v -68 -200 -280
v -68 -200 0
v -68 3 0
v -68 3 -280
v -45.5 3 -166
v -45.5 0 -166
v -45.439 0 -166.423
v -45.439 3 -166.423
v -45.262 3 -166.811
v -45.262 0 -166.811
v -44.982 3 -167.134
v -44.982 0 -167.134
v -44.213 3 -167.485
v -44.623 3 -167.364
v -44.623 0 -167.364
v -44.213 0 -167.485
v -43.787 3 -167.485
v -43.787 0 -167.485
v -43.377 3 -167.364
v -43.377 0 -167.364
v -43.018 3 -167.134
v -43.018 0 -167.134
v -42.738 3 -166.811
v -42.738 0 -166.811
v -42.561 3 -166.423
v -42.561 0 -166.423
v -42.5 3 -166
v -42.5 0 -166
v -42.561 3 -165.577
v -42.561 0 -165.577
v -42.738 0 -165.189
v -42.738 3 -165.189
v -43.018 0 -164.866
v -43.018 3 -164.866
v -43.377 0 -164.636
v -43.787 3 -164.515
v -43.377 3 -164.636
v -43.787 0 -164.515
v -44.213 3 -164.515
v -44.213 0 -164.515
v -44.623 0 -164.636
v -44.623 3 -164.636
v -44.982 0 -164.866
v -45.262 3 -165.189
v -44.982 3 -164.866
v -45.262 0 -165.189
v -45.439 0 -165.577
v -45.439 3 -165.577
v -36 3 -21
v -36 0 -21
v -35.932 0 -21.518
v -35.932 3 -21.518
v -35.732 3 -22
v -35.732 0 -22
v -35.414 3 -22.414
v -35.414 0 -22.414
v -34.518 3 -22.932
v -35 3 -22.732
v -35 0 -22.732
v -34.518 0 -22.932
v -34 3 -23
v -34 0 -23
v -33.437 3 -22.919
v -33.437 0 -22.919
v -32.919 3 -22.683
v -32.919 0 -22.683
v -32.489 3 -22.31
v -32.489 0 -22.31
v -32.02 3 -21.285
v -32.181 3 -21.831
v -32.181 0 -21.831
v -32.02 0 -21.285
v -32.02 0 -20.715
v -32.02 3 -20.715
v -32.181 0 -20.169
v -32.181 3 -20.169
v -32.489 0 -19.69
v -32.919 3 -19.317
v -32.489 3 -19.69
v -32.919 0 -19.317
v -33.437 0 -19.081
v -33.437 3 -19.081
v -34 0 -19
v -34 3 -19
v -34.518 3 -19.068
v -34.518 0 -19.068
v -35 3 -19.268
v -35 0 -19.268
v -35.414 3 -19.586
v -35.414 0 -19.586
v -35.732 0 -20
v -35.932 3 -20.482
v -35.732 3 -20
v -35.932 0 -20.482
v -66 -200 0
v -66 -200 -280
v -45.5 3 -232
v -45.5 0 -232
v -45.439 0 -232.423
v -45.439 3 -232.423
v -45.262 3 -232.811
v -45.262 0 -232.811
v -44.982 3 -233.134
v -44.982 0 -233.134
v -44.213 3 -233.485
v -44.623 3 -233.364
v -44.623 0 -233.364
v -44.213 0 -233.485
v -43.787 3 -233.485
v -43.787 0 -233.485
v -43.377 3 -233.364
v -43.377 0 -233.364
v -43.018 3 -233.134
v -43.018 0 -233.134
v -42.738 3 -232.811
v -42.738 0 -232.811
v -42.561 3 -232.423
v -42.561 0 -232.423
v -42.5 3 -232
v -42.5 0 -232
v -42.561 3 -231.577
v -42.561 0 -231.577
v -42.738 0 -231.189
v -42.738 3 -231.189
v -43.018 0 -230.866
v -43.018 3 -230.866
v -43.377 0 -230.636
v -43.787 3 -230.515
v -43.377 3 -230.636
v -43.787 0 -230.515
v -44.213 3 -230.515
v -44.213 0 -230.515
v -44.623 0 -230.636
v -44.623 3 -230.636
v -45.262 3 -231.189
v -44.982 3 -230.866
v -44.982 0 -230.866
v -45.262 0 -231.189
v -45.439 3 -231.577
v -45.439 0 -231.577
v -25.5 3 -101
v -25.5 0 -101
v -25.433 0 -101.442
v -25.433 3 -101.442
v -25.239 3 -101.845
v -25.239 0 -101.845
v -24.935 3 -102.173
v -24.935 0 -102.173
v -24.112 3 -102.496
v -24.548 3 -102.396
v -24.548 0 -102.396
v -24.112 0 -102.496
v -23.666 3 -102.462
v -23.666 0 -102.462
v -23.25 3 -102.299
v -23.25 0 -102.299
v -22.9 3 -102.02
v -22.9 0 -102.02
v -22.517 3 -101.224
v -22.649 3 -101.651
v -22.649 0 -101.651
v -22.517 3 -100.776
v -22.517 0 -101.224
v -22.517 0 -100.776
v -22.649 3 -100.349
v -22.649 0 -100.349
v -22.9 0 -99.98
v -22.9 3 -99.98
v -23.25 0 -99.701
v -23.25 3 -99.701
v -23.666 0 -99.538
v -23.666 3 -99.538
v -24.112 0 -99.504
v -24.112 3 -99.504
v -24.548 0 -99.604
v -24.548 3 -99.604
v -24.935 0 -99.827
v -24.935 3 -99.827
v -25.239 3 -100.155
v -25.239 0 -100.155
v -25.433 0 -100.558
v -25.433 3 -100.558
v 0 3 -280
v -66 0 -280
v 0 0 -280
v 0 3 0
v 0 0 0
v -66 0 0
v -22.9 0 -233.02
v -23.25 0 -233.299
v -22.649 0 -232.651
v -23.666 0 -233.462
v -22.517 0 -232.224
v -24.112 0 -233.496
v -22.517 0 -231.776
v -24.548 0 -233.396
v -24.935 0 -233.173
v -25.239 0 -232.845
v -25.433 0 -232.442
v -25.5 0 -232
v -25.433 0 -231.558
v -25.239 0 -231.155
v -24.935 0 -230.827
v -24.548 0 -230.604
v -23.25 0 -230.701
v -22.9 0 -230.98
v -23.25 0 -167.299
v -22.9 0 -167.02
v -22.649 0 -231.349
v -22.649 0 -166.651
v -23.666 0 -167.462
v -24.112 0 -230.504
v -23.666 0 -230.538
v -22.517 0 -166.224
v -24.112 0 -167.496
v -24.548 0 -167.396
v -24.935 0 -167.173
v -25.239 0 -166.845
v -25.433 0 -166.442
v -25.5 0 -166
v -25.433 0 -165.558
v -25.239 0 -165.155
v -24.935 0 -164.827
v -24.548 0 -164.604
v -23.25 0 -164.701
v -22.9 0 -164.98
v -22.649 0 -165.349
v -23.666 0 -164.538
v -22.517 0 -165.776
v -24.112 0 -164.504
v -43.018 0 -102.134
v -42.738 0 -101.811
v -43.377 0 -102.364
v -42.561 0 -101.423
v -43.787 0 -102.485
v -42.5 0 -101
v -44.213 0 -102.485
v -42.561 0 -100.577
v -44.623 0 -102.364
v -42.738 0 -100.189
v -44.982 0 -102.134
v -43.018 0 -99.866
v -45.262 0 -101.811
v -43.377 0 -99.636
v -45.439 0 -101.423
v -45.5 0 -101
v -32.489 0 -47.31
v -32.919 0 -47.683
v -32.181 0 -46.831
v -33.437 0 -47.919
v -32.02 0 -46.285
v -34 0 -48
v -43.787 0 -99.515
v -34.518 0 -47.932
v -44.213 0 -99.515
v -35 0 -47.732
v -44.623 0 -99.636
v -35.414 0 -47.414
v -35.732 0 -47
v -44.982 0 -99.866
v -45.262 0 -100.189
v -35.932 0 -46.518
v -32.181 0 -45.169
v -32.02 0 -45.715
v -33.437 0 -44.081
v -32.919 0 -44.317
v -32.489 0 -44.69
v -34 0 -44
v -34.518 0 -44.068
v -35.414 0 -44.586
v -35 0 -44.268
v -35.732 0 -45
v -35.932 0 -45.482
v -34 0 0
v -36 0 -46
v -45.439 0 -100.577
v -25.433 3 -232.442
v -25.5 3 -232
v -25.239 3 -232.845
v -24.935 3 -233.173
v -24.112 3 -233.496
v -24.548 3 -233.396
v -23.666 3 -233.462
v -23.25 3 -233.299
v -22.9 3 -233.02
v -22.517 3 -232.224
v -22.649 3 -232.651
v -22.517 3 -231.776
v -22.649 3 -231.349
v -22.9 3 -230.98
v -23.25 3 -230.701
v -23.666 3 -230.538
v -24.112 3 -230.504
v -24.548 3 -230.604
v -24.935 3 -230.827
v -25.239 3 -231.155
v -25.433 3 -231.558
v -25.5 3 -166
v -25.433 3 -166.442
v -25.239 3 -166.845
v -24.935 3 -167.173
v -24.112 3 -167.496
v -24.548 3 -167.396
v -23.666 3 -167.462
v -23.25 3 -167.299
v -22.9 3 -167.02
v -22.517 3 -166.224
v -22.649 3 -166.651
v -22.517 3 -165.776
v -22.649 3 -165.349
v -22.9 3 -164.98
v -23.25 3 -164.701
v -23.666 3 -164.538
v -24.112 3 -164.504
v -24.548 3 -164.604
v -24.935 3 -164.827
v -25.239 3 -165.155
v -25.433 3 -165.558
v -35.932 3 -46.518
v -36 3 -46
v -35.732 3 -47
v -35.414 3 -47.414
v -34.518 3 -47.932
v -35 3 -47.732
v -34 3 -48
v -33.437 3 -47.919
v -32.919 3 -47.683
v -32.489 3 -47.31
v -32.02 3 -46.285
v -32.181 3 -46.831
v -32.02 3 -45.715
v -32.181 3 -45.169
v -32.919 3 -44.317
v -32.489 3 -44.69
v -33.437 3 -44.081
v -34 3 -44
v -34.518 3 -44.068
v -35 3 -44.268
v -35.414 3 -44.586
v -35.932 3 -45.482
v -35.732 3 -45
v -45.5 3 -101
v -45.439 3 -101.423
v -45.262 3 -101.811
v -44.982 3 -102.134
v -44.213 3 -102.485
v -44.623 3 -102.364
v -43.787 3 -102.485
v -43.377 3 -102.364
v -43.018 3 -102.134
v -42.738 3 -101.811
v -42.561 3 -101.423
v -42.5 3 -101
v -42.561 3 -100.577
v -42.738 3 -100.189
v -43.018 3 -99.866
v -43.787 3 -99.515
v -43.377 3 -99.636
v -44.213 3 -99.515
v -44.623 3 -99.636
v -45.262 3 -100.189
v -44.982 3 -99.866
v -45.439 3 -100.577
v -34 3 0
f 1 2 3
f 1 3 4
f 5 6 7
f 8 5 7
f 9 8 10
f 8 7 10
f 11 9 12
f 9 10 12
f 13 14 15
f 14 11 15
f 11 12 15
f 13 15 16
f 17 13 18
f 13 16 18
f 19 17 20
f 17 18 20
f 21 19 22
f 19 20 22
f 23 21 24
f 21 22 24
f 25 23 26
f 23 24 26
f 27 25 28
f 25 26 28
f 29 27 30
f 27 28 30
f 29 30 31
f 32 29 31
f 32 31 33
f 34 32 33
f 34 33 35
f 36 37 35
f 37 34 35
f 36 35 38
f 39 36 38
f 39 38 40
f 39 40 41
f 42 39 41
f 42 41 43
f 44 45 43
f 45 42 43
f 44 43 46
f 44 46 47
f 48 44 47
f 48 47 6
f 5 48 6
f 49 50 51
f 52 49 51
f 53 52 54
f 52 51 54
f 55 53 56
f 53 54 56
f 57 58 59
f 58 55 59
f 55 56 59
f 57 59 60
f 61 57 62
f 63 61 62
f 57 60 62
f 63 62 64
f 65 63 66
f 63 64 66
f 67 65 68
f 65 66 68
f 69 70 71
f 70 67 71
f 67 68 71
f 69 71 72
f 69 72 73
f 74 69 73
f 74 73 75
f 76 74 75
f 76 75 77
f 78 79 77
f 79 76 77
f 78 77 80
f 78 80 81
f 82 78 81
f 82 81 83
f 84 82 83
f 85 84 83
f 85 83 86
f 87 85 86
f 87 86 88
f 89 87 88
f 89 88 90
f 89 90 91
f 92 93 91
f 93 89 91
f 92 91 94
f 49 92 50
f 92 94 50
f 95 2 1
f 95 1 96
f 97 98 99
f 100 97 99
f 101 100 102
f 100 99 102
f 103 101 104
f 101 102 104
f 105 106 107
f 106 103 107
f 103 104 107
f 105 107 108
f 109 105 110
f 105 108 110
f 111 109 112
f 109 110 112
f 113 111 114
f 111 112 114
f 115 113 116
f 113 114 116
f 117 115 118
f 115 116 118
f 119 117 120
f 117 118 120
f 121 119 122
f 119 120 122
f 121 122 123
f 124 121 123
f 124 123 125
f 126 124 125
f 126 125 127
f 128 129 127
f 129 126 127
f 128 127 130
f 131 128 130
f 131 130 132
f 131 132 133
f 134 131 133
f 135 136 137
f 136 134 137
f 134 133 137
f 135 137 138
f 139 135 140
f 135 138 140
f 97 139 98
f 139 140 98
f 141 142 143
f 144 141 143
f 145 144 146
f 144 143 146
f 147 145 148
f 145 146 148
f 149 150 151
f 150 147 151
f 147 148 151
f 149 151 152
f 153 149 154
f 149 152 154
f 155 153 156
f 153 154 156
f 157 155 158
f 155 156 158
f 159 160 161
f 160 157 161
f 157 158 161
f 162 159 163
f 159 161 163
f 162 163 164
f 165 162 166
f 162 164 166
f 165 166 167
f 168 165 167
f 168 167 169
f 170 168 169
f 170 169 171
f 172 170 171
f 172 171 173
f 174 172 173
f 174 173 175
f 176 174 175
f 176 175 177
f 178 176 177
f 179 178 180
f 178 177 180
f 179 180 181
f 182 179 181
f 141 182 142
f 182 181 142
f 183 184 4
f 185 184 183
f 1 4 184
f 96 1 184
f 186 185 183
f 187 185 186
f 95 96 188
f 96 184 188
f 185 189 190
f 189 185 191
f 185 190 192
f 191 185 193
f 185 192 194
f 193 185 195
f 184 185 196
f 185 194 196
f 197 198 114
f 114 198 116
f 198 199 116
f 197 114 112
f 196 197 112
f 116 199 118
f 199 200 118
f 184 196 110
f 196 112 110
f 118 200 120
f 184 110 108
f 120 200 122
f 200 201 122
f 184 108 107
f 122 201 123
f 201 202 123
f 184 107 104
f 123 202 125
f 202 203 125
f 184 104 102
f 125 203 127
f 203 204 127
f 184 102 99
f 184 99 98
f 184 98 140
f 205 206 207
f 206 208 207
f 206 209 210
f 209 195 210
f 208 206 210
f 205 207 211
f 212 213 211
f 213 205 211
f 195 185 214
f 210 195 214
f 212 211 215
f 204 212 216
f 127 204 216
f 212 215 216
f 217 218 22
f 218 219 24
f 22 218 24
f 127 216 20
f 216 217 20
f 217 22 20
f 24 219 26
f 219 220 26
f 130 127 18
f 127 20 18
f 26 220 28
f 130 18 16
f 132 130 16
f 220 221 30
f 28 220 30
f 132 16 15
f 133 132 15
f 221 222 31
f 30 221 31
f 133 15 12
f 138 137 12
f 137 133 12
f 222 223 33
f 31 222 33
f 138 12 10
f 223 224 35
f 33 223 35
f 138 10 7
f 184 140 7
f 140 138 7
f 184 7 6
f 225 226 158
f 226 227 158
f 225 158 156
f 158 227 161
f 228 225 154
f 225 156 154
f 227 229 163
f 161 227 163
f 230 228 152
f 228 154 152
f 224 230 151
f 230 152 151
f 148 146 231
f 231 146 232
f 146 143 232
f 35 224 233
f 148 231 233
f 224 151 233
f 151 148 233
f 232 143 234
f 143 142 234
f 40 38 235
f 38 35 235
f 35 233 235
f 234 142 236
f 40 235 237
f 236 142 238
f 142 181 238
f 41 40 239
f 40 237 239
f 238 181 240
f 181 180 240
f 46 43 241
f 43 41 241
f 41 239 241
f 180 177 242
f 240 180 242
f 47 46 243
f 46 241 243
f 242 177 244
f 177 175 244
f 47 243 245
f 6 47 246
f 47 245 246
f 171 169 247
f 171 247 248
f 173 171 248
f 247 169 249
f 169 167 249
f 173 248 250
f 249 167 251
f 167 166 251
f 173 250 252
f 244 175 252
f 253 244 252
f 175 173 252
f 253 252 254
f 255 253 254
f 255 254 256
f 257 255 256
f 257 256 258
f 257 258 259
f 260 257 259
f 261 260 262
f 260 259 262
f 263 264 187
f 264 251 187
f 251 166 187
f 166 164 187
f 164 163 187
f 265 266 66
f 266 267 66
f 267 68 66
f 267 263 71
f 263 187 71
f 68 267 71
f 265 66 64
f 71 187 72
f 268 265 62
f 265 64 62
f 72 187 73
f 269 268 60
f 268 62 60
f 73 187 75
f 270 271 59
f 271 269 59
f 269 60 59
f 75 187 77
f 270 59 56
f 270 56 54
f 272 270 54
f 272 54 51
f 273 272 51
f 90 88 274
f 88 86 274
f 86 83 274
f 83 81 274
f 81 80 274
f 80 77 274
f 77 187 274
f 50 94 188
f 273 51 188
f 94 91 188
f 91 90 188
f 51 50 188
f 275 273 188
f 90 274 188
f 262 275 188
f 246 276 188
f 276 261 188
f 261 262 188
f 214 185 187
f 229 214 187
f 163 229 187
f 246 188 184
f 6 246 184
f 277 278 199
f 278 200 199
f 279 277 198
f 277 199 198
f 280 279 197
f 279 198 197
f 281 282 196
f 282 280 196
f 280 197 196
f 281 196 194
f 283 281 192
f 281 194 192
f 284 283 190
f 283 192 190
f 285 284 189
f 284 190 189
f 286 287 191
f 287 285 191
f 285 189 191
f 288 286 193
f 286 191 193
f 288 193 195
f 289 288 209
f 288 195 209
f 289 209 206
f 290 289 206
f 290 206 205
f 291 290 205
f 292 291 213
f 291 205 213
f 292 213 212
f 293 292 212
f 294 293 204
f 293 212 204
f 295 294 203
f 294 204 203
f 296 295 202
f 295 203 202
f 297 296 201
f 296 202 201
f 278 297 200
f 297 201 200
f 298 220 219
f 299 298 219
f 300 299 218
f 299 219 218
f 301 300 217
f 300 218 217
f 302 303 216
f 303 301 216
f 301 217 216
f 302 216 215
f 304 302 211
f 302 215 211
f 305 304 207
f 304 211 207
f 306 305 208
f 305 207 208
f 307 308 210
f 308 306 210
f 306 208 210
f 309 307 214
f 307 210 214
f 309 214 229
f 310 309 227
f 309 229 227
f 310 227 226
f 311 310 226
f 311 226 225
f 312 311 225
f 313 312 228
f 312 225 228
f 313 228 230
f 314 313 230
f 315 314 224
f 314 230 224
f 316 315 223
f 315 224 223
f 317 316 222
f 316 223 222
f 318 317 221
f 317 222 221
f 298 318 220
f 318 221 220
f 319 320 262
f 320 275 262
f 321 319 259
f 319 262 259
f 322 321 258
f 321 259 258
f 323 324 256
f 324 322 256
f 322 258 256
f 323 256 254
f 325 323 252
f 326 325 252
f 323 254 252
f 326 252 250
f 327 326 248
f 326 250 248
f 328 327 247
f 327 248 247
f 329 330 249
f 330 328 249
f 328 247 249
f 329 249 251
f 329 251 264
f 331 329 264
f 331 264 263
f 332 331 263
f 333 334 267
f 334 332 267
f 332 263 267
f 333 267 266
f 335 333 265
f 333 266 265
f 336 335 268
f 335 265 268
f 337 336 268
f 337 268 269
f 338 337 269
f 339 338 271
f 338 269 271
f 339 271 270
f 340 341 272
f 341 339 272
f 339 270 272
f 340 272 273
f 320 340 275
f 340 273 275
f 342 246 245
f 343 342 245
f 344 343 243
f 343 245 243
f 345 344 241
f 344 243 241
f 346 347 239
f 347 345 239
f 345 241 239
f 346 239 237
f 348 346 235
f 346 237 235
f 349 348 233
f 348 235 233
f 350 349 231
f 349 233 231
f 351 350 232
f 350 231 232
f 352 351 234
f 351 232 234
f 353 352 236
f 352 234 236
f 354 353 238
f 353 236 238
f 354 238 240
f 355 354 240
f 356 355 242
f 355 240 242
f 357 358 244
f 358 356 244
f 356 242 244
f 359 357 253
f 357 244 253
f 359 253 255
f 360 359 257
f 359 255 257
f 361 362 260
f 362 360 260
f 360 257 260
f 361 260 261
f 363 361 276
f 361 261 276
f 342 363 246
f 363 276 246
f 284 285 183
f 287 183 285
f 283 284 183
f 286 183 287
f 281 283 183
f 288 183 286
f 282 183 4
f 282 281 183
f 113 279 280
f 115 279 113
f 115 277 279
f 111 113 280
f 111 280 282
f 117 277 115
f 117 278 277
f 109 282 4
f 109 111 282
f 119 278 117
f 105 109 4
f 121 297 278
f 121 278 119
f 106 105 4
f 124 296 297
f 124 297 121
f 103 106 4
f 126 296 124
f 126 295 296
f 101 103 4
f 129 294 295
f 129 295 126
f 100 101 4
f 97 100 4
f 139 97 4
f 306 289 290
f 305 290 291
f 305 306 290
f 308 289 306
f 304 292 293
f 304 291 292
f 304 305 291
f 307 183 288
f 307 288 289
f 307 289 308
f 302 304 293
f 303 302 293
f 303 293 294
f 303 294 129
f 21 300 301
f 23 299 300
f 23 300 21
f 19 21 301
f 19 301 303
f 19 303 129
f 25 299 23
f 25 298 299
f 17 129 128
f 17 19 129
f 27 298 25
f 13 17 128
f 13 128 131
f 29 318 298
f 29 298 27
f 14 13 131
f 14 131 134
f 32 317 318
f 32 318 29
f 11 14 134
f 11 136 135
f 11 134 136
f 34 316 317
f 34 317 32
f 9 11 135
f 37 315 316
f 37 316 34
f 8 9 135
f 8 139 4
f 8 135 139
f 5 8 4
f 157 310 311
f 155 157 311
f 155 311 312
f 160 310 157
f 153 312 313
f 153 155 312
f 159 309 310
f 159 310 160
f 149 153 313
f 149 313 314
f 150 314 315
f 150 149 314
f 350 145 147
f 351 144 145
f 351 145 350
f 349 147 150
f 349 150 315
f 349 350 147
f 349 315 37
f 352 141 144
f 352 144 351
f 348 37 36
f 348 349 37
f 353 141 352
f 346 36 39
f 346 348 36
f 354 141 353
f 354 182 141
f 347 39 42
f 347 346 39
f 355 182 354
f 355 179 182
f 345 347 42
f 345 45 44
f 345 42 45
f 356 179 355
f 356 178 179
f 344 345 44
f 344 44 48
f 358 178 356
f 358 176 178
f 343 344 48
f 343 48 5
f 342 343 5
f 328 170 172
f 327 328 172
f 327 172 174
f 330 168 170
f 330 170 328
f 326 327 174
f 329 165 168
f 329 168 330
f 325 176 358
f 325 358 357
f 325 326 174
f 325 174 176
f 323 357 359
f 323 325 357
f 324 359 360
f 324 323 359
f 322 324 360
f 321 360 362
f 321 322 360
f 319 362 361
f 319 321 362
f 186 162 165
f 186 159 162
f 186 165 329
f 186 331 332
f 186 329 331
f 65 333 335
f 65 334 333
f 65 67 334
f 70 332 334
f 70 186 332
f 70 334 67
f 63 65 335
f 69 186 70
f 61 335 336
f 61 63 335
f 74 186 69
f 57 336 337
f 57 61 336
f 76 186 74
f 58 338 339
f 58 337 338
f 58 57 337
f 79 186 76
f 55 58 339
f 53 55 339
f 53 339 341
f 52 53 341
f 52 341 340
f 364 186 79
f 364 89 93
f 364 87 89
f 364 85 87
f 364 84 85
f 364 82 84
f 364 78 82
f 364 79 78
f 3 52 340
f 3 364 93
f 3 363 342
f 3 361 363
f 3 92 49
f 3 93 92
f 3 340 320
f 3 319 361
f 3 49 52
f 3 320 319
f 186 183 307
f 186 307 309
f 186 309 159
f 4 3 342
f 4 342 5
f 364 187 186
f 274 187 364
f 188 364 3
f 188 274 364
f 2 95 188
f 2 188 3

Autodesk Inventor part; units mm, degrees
ref_plane "YZ Plane" through (0, 0, 0) normal (1, 0, 0) x (0, 1, 0)
ref_plane "XZ Plane" through (0, 0, 0) normal (0, 1, 0) x (-1, 0, 0)
ref_plane "XY Plane" through (0, 0, 0) normal (0, 0, 1) x (1, 0, 0)
sketch "草图1" plane through (0, 0, 0) normal (0, 1, 0) x (-1, 0, 0)
  line L0 (0, 0) -> (68, 0)
  line L1 (68, 0) -> (68, -280)
  line L2 (68, -280) -> (0, -280)
  line L3 (0, -280) -> (0, 0)
  line L4 (34, 0) -> (34, -21)
  circle A0 centre (34, -21) radius 2
  line L5 (34, -21) -> (34, -46)
  circle A1 centre (34, -46) radius 2
  line L6 (34, -46) -> (34, -101)
  line L7 (34, -101) -> (44, -101)
  line L8 (34, -101) -> (24, -101)
  circle A2 centre (44, -101) radius 1.5
  circle A3 centre (24, -101) radius 1.5
  line L9 (34, -101) -> (34, -166)
  line L10 (34, -166) -> (44, -166)
  line L11 (34, -166) -> (24, -166)
  circle A4 centre (44, -166) radius 1.5
  circle A5 centre (24, -166) radius 1.5
  line L12 (34, -166) -> (34, -232)
  line L13 (34, -232) -> (44, -232)
  line L14 (34, -232) -> (24, -232)
  circle A6 centre (44, -232) radius 1.5
  circle A7 centre (24, -232) radius 1.5
  dimension "d0" = 68
  dimension "d1" = 280
  dimension "d2" = 21
  dimension "d3" = 4
  dimension "d4" = 25
  dimension "d5" = 4
  dimension "d6" = 55
  dimension "d7" = 10
  dimension "d8" = 10
  dimension "d9" = 3
  dimension "d10" = 3
  dimension "d11" = 65
  dimension "d12" = 10
  dimension "d13" = 10
  dimension "d14" = 3
  dimension "d15" = 3
  dimension "d16" = 66
  dimension "d17" = 10
  dimension "d18" = 10
  dimension "d19" = 3
  dimension "d20" = 3
extrude "拉伸1" add sketch "草图1" along normal blind 3
sketch "草图3" plane through (0, 0, 0) normal (0, -1, 0) x (1, 0, 0)
  line L0 (0, -280) -> (-68, -280) projected
  line L1 (-68, 0) -> (0, 0) projected
  line L2 (-68, -280) -> (-66, -280)
  line L3 (-66, -280) -> (-66, 0)
  line L4 (-66, 0) -> (-68, 0)
  line L5 (-68, 0) -> (-68, -280)
  dimension "d26" = 2
extrude "拉伸3" add sketch "草图3" along normal blind 200
equation "\"折弯半径\" = 厚度"
equation "\"折弯释压宽度\" = 厚度"
equation "\"折弯释压深度\" = 0.5 * 厚度"
equation "\"拐角释压尺寸\" = 4 * 厚度"
equation "\"最小余量\" = 2 * 厚度"
equation "\"过渡半径\" = 折弯半径"
equation "\"Jacobi半径尺寸\" = 折弯半径"
equation "\"间隙大小\" = 厚度"
equation "\"厚度\" = 0.5"
properties part number "底板3"
